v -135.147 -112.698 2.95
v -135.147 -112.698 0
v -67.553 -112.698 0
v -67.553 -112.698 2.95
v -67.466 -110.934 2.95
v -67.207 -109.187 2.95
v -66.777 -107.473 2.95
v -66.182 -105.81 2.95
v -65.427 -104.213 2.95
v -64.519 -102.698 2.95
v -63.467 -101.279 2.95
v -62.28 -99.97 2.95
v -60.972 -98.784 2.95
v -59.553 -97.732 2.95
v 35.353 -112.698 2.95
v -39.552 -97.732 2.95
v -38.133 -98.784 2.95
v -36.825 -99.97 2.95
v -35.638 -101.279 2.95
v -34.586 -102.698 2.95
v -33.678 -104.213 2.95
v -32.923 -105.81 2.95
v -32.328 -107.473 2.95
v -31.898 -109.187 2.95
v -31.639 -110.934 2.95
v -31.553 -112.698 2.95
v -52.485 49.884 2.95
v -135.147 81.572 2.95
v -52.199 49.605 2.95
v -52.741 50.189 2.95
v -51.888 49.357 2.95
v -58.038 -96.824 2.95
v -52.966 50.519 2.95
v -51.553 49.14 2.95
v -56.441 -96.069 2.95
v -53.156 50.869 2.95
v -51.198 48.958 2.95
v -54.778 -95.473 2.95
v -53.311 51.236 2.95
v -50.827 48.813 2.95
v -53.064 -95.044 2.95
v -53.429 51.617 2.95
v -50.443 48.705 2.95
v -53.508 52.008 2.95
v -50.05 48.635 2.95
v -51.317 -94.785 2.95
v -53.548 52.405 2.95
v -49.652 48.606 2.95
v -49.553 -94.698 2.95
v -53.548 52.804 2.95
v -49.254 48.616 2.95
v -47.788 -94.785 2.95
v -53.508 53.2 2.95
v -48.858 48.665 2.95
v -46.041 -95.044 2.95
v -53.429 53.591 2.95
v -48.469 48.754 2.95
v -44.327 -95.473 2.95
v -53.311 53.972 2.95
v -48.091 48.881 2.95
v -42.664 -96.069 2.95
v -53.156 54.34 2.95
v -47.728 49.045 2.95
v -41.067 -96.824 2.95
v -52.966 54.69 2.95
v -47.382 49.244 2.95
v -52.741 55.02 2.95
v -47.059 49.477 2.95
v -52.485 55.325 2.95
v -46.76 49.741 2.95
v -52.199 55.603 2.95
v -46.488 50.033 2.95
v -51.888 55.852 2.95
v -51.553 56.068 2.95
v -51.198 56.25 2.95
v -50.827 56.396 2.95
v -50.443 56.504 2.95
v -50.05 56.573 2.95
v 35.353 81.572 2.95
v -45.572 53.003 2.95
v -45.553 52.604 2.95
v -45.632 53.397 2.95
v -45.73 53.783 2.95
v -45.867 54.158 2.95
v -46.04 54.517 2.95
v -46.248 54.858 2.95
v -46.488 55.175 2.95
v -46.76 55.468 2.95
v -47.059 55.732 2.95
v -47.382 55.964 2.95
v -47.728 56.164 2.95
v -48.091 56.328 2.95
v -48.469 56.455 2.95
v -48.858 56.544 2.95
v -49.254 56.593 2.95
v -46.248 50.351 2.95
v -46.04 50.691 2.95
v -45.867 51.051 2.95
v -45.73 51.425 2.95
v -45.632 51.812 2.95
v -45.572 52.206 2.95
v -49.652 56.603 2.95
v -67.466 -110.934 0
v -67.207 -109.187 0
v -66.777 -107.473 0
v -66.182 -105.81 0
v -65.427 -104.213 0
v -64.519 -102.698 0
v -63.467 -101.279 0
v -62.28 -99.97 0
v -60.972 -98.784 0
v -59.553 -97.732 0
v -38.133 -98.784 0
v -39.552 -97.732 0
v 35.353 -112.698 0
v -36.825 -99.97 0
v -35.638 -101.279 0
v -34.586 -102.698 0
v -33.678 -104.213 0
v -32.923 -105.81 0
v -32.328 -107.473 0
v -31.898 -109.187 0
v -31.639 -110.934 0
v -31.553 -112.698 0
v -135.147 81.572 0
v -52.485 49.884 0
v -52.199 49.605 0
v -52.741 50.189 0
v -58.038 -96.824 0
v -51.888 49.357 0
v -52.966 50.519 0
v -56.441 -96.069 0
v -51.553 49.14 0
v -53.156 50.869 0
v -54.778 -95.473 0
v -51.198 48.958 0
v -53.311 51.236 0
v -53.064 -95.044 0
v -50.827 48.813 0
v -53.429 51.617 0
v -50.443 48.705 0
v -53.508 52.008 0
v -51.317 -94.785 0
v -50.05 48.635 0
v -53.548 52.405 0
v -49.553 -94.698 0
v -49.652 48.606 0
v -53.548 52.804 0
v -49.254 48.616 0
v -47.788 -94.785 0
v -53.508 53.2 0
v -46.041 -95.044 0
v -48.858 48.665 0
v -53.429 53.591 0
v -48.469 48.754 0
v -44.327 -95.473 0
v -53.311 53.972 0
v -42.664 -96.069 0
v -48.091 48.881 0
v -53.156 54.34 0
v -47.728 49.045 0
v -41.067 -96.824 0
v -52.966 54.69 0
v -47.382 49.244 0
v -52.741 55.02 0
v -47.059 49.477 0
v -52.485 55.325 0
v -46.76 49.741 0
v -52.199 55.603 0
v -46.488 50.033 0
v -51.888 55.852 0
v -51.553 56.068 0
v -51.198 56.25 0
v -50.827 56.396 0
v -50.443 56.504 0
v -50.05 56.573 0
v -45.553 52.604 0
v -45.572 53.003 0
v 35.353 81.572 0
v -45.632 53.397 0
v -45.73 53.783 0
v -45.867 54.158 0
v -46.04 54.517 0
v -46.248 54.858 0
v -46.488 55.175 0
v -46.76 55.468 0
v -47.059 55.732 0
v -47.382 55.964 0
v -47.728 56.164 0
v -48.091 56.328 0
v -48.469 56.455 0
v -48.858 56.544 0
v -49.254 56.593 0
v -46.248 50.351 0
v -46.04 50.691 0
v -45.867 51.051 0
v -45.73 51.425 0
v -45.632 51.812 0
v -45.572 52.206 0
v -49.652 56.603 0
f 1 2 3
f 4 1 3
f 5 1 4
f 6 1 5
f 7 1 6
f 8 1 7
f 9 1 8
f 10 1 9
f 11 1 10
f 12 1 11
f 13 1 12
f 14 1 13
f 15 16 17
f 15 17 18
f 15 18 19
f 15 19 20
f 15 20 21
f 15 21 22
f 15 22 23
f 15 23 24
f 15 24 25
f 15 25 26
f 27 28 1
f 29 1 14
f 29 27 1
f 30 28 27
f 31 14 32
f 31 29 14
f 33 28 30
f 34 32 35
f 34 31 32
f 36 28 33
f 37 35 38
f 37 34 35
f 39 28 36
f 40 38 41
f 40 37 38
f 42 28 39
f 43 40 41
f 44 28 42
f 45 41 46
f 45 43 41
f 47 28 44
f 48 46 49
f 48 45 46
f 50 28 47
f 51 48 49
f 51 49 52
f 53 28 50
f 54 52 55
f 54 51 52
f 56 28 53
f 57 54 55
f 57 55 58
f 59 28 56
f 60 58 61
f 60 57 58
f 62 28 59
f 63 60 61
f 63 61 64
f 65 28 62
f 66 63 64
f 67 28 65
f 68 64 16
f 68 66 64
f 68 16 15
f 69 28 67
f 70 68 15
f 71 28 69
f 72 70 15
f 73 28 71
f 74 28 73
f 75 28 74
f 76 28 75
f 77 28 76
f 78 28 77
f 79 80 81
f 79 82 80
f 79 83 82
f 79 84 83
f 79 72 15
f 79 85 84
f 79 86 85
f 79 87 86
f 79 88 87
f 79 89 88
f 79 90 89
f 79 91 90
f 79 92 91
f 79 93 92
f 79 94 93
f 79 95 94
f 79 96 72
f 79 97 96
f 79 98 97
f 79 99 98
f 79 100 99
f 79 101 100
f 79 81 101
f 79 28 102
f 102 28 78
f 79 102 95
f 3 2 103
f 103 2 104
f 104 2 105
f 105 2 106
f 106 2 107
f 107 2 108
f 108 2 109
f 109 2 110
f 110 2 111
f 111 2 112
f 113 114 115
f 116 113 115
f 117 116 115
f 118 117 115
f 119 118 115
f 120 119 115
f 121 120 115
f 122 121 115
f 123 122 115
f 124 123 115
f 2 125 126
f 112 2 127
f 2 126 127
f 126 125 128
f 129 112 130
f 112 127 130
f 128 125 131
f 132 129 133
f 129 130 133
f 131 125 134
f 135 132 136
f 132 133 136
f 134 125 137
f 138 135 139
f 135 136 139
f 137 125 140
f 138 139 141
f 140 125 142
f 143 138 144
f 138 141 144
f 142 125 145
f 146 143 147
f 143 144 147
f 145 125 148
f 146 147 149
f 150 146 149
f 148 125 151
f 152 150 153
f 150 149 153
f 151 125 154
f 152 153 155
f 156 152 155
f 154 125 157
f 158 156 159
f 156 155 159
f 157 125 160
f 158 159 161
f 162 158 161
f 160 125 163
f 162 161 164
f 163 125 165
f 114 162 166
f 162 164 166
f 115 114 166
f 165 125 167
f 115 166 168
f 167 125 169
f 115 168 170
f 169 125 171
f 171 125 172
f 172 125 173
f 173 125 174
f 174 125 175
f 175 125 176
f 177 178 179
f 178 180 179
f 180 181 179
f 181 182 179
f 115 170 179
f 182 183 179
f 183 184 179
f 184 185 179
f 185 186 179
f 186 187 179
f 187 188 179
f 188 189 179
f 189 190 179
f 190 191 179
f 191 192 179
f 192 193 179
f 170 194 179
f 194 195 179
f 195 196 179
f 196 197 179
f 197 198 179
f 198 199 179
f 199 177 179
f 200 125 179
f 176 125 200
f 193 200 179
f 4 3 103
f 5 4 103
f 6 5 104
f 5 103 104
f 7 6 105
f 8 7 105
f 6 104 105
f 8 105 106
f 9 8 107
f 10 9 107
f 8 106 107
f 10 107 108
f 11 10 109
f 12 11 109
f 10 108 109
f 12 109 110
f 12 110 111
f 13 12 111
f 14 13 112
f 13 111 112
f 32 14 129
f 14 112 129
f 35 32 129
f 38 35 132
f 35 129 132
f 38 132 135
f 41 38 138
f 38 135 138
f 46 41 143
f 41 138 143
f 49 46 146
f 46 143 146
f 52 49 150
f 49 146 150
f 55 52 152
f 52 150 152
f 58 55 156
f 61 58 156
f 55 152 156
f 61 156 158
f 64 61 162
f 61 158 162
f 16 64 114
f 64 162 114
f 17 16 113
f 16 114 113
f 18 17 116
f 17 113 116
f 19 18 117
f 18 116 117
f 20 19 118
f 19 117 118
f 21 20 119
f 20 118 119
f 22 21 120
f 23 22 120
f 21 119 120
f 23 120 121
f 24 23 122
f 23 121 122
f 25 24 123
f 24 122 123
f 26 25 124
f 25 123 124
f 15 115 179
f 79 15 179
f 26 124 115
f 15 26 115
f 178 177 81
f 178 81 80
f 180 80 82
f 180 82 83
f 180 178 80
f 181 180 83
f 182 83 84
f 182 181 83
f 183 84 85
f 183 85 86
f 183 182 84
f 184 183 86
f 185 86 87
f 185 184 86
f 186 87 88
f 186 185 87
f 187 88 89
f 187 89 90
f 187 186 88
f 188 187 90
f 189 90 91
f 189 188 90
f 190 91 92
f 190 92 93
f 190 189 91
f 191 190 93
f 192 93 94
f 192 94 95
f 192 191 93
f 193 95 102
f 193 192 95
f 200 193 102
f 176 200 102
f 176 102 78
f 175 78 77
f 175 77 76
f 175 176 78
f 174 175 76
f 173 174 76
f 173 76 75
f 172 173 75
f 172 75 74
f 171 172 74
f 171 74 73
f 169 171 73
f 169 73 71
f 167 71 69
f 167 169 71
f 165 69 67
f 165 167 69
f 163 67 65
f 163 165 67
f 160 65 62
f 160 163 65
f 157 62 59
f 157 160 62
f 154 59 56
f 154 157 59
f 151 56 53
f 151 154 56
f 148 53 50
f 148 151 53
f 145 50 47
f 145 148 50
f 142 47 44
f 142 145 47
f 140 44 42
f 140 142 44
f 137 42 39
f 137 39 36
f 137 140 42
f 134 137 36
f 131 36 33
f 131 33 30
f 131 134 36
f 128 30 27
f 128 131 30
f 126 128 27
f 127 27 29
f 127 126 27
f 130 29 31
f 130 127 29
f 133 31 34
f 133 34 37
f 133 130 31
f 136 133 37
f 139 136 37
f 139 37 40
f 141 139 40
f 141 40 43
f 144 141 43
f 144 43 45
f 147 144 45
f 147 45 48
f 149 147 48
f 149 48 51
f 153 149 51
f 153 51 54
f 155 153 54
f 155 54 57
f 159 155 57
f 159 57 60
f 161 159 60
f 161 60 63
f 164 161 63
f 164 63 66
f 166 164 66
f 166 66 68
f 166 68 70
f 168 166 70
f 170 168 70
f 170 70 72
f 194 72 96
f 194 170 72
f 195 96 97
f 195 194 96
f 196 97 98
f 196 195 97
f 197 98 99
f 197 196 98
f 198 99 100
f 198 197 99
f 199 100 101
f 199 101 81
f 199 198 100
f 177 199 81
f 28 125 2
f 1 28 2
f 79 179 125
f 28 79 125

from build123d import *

# Parameters (mm, degrees)
SKETCH1_R           = 4
BOSS_EXTRUDE1_DEPTH = 2.95


with BuildPart() as part:
    # Sketch1 → Boss-Extrude1 (new body)
    with BuildSketch(Plane.XY):
        with BuildLine():
            Line((-135.14739229, 81.571587302), (-135.14739229, -112.698412698))
            Line((-135.14739229, -112.698412698), (-67.552558868, -112.698412698))
            ThreePointArc((-67.552558868, -112.698412698), (-49.552558868, -94.698412698), (-31.552558868, -112.698412698))
            Line((-31.552558868, -112.698412698), (35.35260771, -112.698412698))
            Line((35.35260771, -112.698412698), (35.35260771, 81.571587302))
            Line((35.35260771, 81.571587302), (-135.14739229, 81.571587302))
        make_face()
        with Locations((-49.552558868, 52.604329301)):
            Circle(SKETCH1_R, mode=Mode.SUBTRACT)
    extrude(amount=BOSS_EXTRUDE1_DEPTH)


solid = part.part
